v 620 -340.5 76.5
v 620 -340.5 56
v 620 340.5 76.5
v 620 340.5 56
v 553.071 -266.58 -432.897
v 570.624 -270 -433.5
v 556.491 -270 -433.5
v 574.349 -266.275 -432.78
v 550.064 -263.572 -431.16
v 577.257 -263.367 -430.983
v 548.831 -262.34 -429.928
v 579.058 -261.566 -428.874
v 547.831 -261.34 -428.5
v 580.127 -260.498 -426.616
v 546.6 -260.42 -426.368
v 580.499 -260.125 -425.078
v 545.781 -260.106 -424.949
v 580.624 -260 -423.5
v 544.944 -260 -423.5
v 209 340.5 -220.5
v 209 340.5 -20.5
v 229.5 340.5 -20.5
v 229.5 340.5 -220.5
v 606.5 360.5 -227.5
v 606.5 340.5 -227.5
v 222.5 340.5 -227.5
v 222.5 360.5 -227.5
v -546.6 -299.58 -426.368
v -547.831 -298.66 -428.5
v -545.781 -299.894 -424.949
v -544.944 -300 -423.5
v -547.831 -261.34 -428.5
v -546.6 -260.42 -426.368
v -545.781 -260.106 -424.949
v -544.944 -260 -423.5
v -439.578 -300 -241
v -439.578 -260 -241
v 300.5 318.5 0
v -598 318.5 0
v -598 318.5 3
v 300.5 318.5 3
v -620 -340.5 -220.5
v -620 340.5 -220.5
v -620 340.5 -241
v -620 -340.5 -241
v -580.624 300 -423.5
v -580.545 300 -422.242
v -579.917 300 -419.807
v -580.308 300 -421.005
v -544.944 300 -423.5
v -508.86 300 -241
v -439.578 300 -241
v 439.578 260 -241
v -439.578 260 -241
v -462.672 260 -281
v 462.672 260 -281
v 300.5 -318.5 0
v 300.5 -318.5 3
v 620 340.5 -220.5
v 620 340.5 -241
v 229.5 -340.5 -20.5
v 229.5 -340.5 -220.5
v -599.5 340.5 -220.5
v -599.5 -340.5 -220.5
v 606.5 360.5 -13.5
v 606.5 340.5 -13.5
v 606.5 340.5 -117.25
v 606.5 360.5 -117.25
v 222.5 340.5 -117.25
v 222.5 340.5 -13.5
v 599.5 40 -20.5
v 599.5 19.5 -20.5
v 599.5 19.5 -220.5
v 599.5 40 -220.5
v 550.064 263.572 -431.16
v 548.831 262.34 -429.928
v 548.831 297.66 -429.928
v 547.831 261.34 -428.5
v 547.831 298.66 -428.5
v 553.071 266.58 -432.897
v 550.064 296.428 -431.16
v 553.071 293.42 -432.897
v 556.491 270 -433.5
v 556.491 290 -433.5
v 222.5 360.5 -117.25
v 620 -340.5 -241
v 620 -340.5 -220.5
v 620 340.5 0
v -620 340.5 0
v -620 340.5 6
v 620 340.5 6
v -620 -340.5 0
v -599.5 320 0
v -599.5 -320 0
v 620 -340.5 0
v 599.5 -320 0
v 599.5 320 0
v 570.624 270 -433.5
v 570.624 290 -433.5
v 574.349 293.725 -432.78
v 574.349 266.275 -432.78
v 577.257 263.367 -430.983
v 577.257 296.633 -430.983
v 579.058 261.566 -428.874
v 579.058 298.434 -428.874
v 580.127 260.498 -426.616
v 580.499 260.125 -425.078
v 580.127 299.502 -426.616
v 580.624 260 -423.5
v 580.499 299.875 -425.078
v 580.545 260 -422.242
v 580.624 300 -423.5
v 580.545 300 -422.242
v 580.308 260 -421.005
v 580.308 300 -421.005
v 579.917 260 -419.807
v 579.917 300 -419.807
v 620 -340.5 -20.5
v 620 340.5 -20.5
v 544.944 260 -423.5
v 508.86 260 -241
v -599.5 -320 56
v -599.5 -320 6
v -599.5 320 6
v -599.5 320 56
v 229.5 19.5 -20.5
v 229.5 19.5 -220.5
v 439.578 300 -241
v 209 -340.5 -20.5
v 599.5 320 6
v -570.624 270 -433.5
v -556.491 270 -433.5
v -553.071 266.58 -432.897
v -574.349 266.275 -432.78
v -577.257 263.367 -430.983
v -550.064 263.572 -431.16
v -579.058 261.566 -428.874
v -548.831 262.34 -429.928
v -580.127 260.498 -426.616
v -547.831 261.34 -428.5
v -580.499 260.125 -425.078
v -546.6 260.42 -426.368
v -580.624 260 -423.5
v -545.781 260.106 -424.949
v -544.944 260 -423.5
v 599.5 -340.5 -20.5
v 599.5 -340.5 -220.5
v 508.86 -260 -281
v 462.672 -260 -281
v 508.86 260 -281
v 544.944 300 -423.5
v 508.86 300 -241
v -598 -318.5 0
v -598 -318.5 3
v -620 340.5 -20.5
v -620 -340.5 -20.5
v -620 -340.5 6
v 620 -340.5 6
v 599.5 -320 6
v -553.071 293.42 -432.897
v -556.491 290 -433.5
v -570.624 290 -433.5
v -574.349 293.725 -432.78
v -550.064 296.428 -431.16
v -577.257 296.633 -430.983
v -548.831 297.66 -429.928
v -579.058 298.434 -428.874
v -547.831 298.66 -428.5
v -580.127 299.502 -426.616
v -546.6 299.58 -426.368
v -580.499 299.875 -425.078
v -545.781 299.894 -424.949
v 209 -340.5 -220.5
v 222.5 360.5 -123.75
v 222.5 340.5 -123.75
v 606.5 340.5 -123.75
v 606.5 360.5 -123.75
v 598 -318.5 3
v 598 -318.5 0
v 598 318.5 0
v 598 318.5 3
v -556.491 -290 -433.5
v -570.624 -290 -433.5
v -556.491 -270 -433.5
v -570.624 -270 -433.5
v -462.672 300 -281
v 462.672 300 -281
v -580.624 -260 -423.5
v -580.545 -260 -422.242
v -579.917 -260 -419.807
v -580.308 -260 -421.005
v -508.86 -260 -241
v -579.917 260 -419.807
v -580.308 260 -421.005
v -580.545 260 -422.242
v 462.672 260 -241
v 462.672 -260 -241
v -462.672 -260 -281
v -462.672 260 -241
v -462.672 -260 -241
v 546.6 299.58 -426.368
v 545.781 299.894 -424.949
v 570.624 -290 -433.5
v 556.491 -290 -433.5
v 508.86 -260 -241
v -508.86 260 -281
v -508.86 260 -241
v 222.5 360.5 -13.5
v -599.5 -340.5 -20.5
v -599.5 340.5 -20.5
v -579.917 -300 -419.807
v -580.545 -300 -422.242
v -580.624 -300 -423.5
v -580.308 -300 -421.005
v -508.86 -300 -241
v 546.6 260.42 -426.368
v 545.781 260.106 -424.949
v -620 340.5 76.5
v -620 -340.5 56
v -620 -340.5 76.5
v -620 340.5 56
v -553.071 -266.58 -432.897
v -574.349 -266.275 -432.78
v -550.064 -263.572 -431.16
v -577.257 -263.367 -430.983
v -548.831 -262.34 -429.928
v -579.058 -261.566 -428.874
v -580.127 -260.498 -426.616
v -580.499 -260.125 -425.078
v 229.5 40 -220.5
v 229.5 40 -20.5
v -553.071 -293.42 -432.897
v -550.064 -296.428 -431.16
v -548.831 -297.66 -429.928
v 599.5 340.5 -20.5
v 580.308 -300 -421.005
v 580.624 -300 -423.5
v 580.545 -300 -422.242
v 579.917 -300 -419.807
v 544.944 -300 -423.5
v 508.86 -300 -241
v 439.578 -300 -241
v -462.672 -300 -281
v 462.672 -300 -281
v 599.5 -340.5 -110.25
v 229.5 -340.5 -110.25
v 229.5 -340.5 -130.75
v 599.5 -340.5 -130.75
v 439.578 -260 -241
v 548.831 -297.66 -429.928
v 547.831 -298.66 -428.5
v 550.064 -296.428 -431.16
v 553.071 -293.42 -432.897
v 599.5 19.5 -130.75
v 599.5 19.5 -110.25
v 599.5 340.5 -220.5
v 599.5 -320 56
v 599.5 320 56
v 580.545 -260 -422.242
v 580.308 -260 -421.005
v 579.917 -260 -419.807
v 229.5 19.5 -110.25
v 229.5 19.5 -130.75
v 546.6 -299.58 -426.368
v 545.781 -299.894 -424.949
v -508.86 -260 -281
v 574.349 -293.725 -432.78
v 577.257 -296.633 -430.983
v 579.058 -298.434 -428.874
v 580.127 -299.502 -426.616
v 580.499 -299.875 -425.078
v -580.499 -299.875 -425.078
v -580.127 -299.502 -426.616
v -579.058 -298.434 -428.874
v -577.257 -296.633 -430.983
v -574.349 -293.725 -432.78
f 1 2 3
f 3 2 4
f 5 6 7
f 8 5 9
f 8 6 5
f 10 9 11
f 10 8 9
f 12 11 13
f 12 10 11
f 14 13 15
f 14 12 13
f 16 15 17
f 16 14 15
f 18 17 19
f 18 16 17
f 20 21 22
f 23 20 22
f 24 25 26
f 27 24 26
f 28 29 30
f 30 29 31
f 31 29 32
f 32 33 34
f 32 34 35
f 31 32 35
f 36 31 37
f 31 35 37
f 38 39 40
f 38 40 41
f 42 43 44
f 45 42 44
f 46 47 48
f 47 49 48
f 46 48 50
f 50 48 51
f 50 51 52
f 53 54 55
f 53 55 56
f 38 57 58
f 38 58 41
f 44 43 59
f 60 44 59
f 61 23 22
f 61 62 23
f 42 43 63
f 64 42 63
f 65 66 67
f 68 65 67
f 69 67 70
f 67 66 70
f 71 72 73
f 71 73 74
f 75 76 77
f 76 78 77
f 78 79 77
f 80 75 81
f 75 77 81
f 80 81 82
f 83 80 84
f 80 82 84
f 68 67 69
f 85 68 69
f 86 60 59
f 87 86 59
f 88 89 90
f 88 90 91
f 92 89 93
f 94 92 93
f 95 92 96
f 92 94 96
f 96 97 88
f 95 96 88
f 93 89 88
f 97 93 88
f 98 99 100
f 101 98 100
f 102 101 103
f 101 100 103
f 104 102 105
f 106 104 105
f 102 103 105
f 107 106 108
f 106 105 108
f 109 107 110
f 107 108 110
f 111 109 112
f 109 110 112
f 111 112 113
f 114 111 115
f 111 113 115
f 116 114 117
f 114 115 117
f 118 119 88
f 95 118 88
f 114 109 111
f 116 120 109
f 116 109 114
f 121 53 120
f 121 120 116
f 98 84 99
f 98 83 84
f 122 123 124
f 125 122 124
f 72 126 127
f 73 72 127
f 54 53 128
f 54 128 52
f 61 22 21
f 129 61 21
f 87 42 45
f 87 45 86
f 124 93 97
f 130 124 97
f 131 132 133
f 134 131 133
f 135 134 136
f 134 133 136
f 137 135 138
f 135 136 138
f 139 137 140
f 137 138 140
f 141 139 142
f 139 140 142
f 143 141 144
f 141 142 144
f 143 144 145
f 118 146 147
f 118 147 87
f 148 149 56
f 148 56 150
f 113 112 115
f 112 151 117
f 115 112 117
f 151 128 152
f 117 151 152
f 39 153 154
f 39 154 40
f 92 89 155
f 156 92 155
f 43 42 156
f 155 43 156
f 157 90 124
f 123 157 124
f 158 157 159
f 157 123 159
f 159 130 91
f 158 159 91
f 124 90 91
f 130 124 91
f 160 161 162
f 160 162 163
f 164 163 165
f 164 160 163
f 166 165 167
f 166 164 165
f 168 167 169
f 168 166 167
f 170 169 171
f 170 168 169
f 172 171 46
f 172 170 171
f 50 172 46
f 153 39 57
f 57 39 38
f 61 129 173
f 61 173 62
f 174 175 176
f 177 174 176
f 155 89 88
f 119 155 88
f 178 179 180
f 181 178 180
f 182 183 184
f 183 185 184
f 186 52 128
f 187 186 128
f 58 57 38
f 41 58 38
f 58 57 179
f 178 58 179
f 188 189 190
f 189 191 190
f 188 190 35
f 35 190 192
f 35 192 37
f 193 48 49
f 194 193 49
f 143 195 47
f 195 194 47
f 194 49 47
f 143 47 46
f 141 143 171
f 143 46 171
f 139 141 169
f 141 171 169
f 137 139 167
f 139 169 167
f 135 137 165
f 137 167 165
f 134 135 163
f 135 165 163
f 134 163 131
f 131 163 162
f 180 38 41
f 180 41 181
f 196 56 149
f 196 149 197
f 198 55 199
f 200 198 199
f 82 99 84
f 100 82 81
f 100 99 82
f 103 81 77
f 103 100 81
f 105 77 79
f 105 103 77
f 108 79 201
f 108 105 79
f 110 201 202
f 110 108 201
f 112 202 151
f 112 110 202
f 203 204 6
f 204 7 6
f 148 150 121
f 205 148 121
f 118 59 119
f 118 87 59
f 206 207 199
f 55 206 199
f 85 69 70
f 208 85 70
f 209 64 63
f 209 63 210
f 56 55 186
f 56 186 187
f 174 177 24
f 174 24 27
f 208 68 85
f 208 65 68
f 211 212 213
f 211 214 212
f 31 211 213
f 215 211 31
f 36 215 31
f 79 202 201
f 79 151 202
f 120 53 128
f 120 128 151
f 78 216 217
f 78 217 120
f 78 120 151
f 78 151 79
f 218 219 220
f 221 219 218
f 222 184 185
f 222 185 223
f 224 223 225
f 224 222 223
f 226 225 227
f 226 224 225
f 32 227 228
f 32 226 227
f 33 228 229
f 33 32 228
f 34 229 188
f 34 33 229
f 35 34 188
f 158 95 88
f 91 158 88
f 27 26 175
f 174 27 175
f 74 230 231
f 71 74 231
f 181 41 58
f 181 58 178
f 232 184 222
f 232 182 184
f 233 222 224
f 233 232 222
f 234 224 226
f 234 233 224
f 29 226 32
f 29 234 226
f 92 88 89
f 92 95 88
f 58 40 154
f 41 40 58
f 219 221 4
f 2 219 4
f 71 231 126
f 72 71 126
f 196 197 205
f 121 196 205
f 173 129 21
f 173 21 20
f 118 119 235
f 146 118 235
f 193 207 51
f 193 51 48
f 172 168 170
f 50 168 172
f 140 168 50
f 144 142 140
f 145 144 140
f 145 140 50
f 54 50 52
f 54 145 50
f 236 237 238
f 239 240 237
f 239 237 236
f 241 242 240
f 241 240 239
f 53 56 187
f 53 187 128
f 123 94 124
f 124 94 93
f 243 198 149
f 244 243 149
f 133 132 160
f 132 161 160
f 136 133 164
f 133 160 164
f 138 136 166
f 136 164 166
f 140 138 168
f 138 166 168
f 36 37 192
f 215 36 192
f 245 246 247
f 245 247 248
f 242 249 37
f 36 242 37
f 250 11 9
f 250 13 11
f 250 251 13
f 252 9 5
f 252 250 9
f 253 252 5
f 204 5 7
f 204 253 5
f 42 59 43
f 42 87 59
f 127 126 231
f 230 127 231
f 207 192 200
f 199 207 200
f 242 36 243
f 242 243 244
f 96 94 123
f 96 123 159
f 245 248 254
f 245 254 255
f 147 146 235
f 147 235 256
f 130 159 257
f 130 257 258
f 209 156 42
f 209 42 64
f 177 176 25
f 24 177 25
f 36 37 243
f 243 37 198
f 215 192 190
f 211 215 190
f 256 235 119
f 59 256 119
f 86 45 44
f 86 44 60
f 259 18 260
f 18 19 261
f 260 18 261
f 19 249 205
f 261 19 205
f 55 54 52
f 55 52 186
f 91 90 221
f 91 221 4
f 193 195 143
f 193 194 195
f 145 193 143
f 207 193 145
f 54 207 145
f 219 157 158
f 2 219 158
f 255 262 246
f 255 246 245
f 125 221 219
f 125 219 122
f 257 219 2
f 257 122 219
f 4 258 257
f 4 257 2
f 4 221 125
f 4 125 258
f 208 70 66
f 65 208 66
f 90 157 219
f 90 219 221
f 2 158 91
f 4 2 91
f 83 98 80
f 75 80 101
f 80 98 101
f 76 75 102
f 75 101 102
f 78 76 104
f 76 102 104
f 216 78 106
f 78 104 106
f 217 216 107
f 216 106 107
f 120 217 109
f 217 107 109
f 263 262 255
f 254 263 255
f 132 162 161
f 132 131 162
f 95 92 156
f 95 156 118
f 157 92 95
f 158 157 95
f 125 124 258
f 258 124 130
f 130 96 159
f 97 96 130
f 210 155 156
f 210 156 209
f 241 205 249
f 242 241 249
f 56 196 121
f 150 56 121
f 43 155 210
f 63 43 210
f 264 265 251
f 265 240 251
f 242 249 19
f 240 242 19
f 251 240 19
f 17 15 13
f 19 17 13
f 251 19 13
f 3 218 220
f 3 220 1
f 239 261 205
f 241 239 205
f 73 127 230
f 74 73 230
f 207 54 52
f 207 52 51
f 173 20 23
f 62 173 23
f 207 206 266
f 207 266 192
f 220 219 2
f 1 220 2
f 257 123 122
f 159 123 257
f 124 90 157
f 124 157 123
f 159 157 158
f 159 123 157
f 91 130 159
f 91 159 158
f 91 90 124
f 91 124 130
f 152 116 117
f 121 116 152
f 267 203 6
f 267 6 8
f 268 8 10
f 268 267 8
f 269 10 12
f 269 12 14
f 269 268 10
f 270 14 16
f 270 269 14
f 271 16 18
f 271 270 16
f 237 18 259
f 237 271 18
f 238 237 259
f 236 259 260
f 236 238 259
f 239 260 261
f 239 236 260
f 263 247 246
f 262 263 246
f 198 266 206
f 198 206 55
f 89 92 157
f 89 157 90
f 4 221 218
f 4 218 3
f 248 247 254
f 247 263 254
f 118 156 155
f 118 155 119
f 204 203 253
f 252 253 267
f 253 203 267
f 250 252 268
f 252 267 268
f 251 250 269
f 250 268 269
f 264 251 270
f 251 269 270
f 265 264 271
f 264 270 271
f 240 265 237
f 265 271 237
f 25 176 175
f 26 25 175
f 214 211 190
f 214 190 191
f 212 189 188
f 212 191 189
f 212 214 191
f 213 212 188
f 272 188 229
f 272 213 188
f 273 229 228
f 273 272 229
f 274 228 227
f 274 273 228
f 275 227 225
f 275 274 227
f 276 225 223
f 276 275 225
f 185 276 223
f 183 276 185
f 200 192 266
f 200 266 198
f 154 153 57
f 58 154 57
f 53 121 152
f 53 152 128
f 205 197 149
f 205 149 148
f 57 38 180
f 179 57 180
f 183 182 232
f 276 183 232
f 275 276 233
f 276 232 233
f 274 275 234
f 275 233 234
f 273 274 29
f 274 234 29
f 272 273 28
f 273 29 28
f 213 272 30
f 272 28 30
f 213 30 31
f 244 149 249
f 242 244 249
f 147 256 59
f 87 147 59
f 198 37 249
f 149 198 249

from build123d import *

# Parameters (mm, degrees)
F1_DEPTH       = 340.5
F1_DEPTH_BACK  = 340.5
F2_DEPTH       = 340.5
F2_DEPTH_BACK  = 340.5
F0_W           = 20.5
F0_H           = 200
F3_DEPTH       = 340.5
F3_DEPTH_BACK  = 340.5
F6_DEPTH       = 40
F7_R           = 10
F7_2_R         = 10
F8_DEPTH       = 40
F10_W          = 46.1880215352
F10_H          = 40
F11_DEPTH      = 520
F12_W          = 7
F12_H          = 96.75
F13_DEPTH      = 20
F14_W          = 1240
F14_H          = 681
F14_W_2        = 1230
F14_H_2        = 671
F14_W_3        = 1199
F14_H_3        = 640
F15_DEPTH      = 6
F16_W          = 898.5
F16_H          = 637
F17_DEPTH      = 3
F16_W_2        = 297.5
F18_DEPTH      = 3
F19_DEPTH      = 50
F20_W          = 1240
F20_H          = 681
F21_DEPTH      = 20.5
F23_DEPTH      = 370
F0_W_2         = 370
F0_H_2         = 20.5
F24_DEPTH      = 19.5
F24_DEPTH_BACK = 340.5


# Not quite as in the source:
# - a feature names something its author has since deleted; it is built from what else it names


with BuildPart() as f1:
    # F0 (on Front) → F1 (new body, two sides)
    with BuildSketch(Plane.XZ) as f1_sk:
        Polygon((-599.5, -220.5), (-620, -220.5), (-620, -241), (620, -241), (620, -220.5), (599.5, -220.5), (229.5, -220.5), (209, -220.5), align=None)
    extrude(amount=F1_DEPTH)
    extrude(f1_sk.sketch, amount=-F1_DEPTH_BACK)


with BuildPart() as f2:
    # F0 (on Front) → F2 (new body, two sides)
    with BuildSketch(Plane.XZ) as f2_sk:
        Polygon((229.5, -20.5), (209, -20.5), (209, -220.5), (229.5, -220.5), (229.5, -130.75), (229.5, -110.25), align=None)
    extrude(amount=F2_DEPTH)
    extrude(f2_sk.sketch, amount=-F2_DEPTH_BACK)


with BuildPart() as f2b:
    # F0 (on Front) → F2, piece 2 (new body, two sides)
    with BuildSketch(Plane.XZ) as f2_2_sk:
        with Locations((-609.75, -120.5)):
            Rectangle(F0_W, F0_H)
    extrude(amount=F2_DEPTH)
    extrude(f2_2_sk.sketch, amount=-F2_DEPTH_BACK)


with BuildPart() as f2c:
    # F0 (on Front) → F2, piece 3 (new body, two sides)
    with BuildSketch(Plane.XZ) as f2_3_sk:
        Polygon((620, -220.5), (620, -20.5), (599.5, -20.5), (599.5, -110.25), (599.5, -130.75), (599.5, -220.5), align=None)
    extrude(amount=F2_DEPTH)
    extrude(f2_3_sk.sketch, amount=-F2_DEPTH_BACK)


with BuildPart() as f3:
    # F0 (on Front) → F3 (new body, two sides)
    with BuildSketch(Plane.XZ) as f3_sk:
        Polygon((620, 0), (-620, 0), (-620, -20.5), (-599.5, -20.5), (209, -20.5), (229.5, -20.5), (599.5, -20.5), (620, -20.5), align=None)
    extrude(amount=F3_DEPTH)
    extrude(f3_sk.sketch, amount=-F3_DEPTH_BACK)


with BuildPart() as f6:
    # F5 (on offset) → F6 (new body)
    with BuildSketch(Plane.XZ.offset(260)):
        Polygon((-439.5780408782, -241), (-508.860073181, -241), (-585.3589838486, -433.5), (-550.7179676972, -433.5), (-462.6720516458, -281), align=None)
    extrude(amount=F6_DEPTH)

    # F7
    f7_edges = [f6.edges().sort_by_distance(p)[0] for p in [
        (-568.038476, -300, -433.5),
        (-550.717968, -280, -433.5),
        (-568.038476, -260, -433.5),
        (-585.358984, -280, -433.5),
    ]]
    fillet(f7_edges, radius=F7_R)


with BuildPart() as f6b:
    # F5 (on offset) → F6, piece 2 (new body)
    with BuildSketch(Plane.XZ.offset(260)):
        Polygon((508.860073181, -241), (439.5780408782, -241), (462.6720516458, -281), (550.7179676972, -433.5), (585.3589838486, -433.5), align=None)
    extrude(amount=F6_DEPTH)

    # F7#2
    f7_2_edges = [f6b.edges().sort_by_distance(p)[0] for p in [
        (568.038476, -300, -433.5),
        (550.717968, -280, -433.5),
        (568.038476, -260, -433.5),
        (585.358984, -280, -433.5),
    ]]
    fillet(f7_2_edges, radius=F7_2_R)


with BuildPart() as f8:
    # F5 (on offset) → F8 (new body)
    with BuildSketch(Plane.XZ.offset(260)):
        Polygon((439.5780408782, -241), (-439.5780408782, -241), (-462.6720516458, -281), (462.6720516458, -281), align=None)
    extrude(amount=F8_DEPTH)


with BuildPart() as f9_1:
    # F9: instance of F6
    add(f6.part.mirror(Plane.XZ))


with BuildPart() as f9_2:
    # F9: instance of F6b
    add(f6b.part.mirror(Plane.XZ))


with BuildPart() as f9_3:
    # F9: instance of F8
    add(f8.part.mirror(Plane.XZ))


with BuildPart() as f11:
    # F10 (on face) → F11 (new body, through all)
    with BuildSketch(Plane.XZ.offset(260)):
        with Locations((485.7660624134, -261)):
            Rectangle(F10_W, F10_H)
    extrude(amount=-F11_DEPTH)


with BuildPart() as f11b:
    # F10 (on face) → F11, piece 2 (new body, through all)
    with BuildSketch(Plane.XZ.offset(260)):
        with Locations((-485.7660624134, -261)):
            Rectangle(F10_W, F10_H)
    extrude(amount=-F11_DEPTH)


with BuildPart() as f13:
    # F12 (on face) → F13 (new body)
    with BuildSketch(Plane(origin=(0, 340.5, 0), x_dir=(-1, 0, 0), z_dir=(0, 1, 0))):
        with Locations((-603, -68.875)):
            Rectangle(F12_W, F12_H)
        Polygon((-222.5, -117.25), (-222.5, -13.5), (-606.5, -13.5), (-606.5, -20.5), (-599.5, -20.5), (-599.5, -117.25), align=None)
    extrude(amount=F13_DEPTH)


with BuildPart() as f13b:
    # F12 (on face) → F13, piece 2 (new body)
    with BuildSketch(Plane(origin=(0, 340.5, 0), x_dir=(-1, 0, 0), z_dir=(0, 1, 0))):
        with Locations((-603, -172.125)):
            Rectangle(F12_W, F12_H)
        Polygon((-222.5, -123.75), (-599.5, -123.75), (-599.5, -220.5), (-606.5, -220.5), (-606.5, -227.5), (-222.5, -227.5), align=None)
    extrude(amount=F13_DEPTH)


with BuildPart() as f15:
    # F14 (on face) → F15 (new body)
    with BuildSketch(Plane.XY):
        Rectangle(F14_W, F14_H)
        Rectangle(F14_W_2, F14_H_2, mode=Mode.SUBTRACT)
        Rectangle(F14_W_2, F14_H_2)
        Rectangle(F14_W_3, F14_H_3, mode=Mode.SUBTRACT)
    extrude(amount=F15_DEPTH)


with BuildPart() as f17:
    # F16 (on face) → F17 (new body)
    with BuildSketch(Plane.XY):
        with Locations((-148.75, 0)):
            Rectangle(F16_W, F16_H)
    extrude(amount=F17_DEPTH)


with BuildPart() as f18:
    # F16 (on face) → F18 (new body, through all)
    with BuildSketch(Plane.XY):
        with Locations((449.25, 0)):
            Rectangle(F16_W_2, F16_H)
    extrude(amount=F18_DEPTH)


with BuildPart() as f19:
    # F19 (new): a face of the model
    f19_faces = [f15.part.faces().sort_by_distance(p)[0] for p in [
        (-613.646946667, 0, 6),
    ]]
    extrude(f19_faces, amount=F19_DEPTH)


with BuildPart() as f21:
    # F20 (on face) → F21 (new body)
    with BuildSketch(Plane.XY.offset(56)):
        Rectangle(F20_W, F20_H)
    extrude(amount=F21_DEPTH)


with BuildPart() as f23:
    # F22 (on face) → F23 (new body, through all)
    with BuildSketch(Plane.YZ.offset(229.5)):
        Polygon((40, -20.5), (19.5, -20.5), (19.5, -130.75), (19.5, -220.5), (40, -220.5), (40, -130.75), align=None)
    extrude(amount=F23_DEPTH)


with BuildPart() as f24:
    # F0 (on Front) → F24 (new body, two sides)
    with BuildSketch(Plane.XZ) as f24_sk:
        with Locations((414.5, -120.5)):
            Rectangle(F0_W_2, F0_H_2)
    extrude(amount=-F24_DEPTH)
    extrude(f24_sk.sketch, amount=F24_DEPTH_BACK)


solid = Compound([f1.part, f2.part, f2b.part, f2c.part, f3.part, f6.part, f6b.part, f8.part, f9_1.part, f9_2.part, f9_3.part, f11.part, f11b.part, f13.part, f13b.part, f15.part, f17.part, f18.part, f19.part, f21.part, f23.part, f24.part])
